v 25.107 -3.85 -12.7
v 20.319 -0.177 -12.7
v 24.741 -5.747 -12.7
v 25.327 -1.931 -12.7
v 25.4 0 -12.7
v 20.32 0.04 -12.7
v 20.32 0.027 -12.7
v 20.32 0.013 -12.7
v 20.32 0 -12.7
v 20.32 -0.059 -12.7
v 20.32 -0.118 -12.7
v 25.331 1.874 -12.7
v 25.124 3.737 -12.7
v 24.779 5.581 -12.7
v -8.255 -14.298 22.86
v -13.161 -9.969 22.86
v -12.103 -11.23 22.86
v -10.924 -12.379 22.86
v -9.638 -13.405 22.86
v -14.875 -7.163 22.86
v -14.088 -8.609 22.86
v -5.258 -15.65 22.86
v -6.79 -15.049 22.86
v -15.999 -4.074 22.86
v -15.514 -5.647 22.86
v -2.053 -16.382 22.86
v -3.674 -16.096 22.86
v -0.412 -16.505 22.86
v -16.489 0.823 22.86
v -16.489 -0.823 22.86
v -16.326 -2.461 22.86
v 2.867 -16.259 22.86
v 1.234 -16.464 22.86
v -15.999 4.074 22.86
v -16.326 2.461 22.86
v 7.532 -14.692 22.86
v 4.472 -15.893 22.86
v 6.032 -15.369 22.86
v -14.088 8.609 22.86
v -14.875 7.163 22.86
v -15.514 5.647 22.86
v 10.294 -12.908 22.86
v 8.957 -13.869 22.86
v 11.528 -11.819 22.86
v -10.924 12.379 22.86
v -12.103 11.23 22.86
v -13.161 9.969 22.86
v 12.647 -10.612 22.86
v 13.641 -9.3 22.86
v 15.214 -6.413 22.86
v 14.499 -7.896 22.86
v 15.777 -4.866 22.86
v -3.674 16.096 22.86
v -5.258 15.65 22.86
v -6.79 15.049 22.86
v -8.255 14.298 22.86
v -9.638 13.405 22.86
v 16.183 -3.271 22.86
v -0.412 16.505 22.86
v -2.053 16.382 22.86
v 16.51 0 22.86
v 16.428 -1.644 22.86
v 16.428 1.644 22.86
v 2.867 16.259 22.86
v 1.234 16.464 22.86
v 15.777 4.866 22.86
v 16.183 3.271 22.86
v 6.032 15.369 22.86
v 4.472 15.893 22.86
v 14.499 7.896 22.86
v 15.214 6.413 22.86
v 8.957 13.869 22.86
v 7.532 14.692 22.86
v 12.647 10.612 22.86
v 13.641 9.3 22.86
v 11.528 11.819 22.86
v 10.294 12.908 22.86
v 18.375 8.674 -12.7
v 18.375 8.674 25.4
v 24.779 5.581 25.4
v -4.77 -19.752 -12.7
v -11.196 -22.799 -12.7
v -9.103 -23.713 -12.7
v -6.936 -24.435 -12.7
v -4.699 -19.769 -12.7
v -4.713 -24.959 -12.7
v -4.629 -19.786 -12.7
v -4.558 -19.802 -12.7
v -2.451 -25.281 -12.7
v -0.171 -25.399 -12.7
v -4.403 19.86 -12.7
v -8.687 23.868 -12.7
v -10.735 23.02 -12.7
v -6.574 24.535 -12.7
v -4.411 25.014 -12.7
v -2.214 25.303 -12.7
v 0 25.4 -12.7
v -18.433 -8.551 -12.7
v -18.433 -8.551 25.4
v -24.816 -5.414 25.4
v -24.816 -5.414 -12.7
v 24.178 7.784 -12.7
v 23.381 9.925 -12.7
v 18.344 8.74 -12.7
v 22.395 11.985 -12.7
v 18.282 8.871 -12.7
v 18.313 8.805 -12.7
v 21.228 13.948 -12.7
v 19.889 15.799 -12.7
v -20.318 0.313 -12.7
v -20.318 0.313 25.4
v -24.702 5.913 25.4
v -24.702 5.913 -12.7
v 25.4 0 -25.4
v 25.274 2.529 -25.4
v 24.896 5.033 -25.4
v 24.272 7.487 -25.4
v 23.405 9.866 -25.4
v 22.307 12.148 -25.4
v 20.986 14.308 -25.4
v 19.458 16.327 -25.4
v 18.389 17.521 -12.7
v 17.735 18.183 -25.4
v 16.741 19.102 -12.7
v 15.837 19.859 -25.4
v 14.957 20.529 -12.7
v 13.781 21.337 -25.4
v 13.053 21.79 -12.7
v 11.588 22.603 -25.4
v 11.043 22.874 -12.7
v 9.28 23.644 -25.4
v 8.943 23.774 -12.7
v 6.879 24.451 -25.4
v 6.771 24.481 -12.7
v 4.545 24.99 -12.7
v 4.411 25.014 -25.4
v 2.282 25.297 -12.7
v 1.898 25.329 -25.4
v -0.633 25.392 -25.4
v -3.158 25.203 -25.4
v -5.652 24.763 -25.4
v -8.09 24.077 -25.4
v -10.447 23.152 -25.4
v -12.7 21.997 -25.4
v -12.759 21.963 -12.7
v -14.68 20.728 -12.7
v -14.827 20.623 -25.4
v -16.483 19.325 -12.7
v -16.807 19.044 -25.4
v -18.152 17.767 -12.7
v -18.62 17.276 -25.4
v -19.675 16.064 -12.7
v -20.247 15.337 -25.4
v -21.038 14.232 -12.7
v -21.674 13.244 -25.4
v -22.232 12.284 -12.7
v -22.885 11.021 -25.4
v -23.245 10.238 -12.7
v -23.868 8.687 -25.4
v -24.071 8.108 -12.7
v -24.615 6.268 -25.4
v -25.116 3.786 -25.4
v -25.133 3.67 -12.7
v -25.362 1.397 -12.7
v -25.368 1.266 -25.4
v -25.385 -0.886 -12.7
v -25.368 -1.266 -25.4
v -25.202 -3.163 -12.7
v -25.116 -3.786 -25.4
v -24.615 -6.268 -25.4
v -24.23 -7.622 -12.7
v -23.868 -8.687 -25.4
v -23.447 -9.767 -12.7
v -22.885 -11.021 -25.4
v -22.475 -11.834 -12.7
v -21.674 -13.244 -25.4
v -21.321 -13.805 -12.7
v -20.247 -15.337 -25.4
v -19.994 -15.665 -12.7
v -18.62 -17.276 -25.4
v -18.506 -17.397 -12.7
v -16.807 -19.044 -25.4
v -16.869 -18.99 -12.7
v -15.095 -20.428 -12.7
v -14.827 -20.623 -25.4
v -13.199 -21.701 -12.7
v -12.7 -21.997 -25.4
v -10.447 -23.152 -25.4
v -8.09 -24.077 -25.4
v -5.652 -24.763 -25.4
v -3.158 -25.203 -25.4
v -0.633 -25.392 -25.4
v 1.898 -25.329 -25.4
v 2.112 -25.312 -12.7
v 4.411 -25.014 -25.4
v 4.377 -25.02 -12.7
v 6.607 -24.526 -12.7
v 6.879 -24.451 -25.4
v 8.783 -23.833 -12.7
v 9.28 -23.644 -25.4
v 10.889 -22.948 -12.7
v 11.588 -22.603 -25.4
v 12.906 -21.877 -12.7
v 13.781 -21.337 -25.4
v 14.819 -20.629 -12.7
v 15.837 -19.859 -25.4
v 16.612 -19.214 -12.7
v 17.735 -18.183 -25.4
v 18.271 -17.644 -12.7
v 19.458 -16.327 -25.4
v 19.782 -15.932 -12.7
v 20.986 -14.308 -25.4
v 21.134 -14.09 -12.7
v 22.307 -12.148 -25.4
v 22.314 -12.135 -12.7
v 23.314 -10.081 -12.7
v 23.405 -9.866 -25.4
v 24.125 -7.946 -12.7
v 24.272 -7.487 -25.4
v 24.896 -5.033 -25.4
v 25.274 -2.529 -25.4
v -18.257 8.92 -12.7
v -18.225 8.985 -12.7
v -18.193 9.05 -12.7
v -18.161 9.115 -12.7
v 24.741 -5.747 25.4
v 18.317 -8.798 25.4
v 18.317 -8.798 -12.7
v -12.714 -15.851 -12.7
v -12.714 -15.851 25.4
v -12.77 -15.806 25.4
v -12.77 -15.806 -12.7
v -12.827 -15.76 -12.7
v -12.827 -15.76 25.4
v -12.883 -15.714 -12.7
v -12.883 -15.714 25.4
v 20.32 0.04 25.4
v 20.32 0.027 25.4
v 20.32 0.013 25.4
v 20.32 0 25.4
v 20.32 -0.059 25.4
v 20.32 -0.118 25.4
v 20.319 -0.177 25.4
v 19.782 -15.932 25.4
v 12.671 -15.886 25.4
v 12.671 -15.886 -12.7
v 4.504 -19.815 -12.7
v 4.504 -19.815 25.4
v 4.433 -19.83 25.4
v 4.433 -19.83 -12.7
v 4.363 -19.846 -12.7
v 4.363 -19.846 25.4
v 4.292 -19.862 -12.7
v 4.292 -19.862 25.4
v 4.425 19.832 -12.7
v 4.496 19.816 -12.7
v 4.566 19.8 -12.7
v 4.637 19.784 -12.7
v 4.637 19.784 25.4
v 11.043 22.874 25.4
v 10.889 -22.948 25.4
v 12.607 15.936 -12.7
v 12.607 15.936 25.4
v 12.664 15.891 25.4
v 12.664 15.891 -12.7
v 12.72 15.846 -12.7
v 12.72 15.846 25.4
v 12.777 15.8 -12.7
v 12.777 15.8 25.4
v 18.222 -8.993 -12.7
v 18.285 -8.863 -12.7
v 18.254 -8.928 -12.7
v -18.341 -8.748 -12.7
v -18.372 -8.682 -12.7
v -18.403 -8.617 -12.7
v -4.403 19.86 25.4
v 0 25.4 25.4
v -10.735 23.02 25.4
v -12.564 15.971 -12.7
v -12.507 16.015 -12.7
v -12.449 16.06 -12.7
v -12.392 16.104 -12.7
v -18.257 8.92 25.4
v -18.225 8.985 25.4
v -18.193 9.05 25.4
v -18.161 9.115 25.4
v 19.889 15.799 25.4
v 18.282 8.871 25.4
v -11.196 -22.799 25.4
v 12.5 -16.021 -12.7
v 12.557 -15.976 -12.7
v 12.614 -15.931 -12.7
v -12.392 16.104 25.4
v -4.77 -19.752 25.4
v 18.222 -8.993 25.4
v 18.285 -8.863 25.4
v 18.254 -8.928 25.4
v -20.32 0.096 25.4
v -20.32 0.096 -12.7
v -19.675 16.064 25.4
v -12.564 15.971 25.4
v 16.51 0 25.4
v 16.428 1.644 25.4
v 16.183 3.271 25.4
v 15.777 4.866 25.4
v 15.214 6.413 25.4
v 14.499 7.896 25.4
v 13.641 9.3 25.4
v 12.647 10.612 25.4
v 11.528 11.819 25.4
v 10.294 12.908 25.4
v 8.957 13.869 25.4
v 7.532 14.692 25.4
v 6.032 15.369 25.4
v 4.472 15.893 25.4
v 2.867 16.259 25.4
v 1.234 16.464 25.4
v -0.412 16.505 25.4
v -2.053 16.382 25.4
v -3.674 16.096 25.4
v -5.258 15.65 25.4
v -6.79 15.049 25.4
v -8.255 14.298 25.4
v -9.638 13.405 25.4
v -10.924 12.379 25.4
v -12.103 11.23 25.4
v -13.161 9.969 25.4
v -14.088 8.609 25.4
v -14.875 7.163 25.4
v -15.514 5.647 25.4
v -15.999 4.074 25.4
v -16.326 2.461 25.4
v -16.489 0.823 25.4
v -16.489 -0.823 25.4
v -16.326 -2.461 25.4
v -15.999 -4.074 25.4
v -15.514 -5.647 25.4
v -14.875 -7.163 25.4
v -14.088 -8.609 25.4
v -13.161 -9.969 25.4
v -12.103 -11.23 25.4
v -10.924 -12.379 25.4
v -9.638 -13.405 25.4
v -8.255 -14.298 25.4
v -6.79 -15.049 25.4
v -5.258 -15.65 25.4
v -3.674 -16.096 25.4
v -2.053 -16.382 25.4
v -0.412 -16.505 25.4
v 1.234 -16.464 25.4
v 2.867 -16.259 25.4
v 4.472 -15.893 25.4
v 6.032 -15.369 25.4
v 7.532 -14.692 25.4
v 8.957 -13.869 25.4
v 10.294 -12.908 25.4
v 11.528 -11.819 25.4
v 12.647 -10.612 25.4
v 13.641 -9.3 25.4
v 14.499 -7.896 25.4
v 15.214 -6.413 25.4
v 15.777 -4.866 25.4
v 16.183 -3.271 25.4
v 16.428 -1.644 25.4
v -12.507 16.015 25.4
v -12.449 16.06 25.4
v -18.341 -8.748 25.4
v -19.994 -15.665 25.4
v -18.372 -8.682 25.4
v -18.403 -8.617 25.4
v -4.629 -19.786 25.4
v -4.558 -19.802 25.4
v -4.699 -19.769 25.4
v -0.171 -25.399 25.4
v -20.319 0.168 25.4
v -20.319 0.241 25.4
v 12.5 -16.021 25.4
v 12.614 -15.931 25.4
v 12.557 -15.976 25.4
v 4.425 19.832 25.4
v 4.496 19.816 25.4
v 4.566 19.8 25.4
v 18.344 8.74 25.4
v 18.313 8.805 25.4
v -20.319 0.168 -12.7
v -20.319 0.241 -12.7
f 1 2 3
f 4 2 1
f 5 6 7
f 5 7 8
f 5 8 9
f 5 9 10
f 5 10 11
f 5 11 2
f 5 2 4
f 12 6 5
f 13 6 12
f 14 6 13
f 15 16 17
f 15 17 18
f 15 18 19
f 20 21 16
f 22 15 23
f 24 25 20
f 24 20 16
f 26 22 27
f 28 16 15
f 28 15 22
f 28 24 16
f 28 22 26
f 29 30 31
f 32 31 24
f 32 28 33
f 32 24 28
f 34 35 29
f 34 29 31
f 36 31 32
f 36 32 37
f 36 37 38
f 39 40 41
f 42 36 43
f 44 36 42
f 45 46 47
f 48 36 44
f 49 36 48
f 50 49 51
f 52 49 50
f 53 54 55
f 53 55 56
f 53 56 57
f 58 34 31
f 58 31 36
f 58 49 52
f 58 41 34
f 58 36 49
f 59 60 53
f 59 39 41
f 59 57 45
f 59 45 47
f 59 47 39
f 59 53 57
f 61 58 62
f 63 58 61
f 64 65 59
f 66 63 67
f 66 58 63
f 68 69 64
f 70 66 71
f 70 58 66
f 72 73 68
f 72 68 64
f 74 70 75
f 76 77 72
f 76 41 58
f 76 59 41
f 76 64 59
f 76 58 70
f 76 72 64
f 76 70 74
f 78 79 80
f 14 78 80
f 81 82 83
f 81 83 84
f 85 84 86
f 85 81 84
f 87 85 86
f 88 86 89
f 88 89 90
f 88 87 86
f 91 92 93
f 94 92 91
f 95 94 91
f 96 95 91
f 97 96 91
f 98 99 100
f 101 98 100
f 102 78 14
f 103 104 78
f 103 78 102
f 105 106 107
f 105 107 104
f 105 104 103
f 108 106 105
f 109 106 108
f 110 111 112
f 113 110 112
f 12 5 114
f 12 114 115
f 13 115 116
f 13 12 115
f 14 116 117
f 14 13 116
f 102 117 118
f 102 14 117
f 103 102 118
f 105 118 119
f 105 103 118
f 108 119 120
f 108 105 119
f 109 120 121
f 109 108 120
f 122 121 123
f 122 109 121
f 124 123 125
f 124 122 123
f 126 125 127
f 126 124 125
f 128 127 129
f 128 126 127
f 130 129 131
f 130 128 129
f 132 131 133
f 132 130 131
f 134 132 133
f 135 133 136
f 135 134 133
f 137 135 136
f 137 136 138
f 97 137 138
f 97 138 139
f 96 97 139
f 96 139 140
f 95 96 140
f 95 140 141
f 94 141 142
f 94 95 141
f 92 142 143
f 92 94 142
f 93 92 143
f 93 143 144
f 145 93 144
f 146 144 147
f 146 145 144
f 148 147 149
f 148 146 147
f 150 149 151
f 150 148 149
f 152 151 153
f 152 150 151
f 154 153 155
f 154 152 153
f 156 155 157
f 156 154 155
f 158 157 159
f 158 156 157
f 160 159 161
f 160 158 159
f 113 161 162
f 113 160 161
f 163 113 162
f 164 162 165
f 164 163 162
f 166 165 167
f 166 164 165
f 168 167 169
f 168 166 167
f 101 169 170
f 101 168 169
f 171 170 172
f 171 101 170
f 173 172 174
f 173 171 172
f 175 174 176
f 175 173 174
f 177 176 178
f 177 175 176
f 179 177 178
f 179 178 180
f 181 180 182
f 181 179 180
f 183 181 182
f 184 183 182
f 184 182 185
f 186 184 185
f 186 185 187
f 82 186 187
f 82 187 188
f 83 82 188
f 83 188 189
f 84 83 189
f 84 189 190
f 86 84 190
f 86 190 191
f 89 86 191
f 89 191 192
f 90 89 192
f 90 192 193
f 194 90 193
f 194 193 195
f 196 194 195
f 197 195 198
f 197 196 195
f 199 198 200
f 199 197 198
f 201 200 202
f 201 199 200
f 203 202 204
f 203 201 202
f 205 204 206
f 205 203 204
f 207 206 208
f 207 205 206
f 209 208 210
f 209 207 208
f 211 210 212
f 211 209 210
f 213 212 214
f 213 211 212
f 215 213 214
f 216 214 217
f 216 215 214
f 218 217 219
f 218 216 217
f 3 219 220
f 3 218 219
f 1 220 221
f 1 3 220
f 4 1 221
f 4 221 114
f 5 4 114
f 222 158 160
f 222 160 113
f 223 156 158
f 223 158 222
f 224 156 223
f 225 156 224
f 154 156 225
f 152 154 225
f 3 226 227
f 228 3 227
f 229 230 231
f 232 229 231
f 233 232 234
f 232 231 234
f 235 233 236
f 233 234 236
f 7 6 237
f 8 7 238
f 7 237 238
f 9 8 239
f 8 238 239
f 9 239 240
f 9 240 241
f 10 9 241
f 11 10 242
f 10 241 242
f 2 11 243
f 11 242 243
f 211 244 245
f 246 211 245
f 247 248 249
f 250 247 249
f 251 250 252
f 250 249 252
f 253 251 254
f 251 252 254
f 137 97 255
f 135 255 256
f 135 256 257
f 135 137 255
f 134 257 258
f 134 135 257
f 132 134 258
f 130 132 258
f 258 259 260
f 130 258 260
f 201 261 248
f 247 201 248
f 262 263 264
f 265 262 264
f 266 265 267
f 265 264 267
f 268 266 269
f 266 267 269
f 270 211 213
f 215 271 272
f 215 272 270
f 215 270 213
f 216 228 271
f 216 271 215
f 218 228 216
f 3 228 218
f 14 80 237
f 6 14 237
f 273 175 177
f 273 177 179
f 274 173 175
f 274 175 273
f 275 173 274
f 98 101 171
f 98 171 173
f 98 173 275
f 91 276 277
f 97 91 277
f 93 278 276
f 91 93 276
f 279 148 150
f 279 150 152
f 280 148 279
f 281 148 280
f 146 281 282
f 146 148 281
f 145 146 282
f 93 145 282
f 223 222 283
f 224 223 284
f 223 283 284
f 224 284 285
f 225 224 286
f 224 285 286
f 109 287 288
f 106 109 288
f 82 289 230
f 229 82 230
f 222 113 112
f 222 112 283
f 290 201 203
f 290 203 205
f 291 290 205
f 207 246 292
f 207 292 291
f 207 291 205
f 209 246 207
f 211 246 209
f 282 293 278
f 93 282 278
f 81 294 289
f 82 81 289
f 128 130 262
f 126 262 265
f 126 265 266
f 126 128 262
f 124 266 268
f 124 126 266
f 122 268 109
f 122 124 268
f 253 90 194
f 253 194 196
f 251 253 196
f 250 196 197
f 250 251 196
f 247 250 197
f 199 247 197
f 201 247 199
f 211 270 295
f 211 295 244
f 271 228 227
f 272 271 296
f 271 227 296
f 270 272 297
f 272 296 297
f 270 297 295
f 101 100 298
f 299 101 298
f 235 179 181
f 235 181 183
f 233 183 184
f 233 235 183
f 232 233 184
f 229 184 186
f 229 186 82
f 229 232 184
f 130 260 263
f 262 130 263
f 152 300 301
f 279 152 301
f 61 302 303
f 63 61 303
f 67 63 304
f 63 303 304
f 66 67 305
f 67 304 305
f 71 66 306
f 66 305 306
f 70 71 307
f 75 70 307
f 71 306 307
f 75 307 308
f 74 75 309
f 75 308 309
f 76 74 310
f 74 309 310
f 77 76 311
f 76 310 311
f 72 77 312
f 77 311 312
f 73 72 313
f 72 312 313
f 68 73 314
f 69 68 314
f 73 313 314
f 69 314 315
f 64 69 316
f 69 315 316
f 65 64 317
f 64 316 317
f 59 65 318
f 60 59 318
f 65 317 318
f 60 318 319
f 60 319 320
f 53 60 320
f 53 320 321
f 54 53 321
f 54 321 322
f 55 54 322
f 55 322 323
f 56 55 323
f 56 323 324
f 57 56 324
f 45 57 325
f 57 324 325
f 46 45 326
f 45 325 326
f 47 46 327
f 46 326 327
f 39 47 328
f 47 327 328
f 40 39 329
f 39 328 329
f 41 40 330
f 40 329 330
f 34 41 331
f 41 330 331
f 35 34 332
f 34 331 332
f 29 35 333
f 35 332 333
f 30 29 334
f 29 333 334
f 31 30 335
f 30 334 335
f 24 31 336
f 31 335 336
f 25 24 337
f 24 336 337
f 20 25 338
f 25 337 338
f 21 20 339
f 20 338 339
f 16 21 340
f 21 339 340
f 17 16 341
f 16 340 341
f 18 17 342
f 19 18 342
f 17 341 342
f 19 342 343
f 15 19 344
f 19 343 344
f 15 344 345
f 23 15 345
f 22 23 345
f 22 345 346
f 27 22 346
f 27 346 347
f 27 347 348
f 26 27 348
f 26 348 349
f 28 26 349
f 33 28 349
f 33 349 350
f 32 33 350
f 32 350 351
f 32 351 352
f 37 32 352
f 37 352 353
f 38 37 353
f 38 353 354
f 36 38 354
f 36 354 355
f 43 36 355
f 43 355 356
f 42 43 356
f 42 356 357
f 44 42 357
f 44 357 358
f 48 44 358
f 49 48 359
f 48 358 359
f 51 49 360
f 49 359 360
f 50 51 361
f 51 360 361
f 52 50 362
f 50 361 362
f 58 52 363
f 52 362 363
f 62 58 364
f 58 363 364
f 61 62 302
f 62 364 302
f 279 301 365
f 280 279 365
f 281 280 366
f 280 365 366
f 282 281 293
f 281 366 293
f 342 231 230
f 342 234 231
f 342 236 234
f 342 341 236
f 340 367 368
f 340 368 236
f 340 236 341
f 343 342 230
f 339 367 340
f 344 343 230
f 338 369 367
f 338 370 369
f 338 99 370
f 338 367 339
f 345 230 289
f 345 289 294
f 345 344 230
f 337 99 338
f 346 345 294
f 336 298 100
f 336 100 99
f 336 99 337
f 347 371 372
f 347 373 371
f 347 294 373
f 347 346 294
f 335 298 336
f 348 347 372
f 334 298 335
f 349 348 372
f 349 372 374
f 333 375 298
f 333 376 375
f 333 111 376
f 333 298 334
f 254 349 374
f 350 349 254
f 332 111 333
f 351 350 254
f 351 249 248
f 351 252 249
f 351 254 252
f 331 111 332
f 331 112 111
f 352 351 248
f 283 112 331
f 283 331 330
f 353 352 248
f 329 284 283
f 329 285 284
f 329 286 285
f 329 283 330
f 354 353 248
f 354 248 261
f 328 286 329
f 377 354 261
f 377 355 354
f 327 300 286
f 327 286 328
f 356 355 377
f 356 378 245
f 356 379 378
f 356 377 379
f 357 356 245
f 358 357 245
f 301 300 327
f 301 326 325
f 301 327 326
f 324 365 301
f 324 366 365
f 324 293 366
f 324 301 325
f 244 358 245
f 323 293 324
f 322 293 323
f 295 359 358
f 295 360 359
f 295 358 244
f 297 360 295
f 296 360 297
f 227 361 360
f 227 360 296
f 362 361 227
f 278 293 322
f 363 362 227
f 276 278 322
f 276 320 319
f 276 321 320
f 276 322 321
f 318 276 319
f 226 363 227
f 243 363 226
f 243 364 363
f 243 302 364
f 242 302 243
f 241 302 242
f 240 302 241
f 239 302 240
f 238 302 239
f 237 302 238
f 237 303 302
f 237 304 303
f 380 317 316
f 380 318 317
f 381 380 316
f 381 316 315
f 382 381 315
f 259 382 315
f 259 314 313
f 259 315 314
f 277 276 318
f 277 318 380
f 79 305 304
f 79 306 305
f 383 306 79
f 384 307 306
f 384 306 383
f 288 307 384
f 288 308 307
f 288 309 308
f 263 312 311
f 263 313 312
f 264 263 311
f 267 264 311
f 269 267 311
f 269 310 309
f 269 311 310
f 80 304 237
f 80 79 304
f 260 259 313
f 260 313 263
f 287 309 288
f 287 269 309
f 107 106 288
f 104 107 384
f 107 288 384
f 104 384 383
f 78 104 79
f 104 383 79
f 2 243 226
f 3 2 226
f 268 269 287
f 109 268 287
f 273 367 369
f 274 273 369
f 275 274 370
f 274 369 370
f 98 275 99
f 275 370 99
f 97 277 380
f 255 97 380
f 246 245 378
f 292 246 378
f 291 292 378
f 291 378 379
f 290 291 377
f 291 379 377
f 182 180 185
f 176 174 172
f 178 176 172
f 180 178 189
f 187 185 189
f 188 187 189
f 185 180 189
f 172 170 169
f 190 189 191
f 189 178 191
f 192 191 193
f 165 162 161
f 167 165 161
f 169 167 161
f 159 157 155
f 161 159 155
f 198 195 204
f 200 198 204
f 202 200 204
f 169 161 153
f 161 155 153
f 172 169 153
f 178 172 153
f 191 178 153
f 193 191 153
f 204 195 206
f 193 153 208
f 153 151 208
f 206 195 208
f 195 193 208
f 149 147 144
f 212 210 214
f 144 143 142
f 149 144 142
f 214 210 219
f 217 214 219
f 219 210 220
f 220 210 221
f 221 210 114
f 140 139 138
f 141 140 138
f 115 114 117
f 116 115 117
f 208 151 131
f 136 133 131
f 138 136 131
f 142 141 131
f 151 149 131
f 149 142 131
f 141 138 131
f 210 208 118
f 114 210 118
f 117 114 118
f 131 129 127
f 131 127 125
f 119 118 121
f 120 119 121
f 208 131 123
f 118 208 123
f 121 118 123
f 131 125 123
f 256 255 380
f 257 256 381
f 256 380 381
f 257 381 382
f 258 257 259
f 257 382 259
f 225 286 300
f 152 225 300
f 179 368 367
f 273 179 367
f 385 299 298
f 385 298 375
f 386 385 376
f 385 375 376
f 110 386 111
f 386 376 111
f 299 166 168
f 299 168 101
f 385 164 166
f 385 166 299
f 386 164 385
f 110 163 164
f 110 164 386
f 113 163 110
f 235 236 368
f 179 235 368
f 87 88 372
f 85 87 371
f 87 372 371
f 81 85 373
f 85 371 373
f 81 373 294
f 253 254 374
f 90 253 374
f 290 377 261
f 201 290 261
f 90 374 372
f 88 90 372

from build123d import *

# Parameters (mm, degrees)
F0_R     = 25.4
F1_DEPTH = 25.4
F3_DEPTH = 38.1
F4_R     = 16.51
F5_DEPTH = 2.54


with BuildPart() as f1:
    # F0 (on Top) → F1 (new body, symmetric)
    with BuildSketch(Plane.XY):
        Circle(F0_R)
    extrude(amount=F1_DEPTH, both=True)

    # F2 (on face) → F3 (cut)
    with BuildSketch(Plane.XY.offset(25.4)):
        with BuildLine():
            Line((-4.4029086505, 19.8602374906), (0, 25.4))
            ThreePointArc((0, 25.4), (-5.497566194, 24.7979185808), (-10.7345038482, 23.0202177907))
            Line((-10.7345038482, 23.0202177907), (-4.4029086505, 19.8602374906))
        make_face()
        with BuildLine():
            Line((4.6370208097, 19.7838428525), (11.0425876049, 22.8740302305))
            ThreePointArc((11.0425876049, 22.8740302305), (5.6639046666, 24.7604560525), (0, 25.4))
            Line((0, 25.4), (4.4250969953, 19.83232))
            ThreePointArc((4.4250969953, 19.83232), (4.5311237333, 19.808364842), (4.6370208097, 19.7838428525))
        make_face()
        with BuildLine():
            Line((12.776857167, 15.8004531876), (19.8888569054, 15.7985243297))
            ThreePointArc((19.8888569054, 15.7985243297), (15.865190223, 19.8357187716), (11.0425876049, 22.8740302305))
            Line((11.0425876049, 22.8740302305), (12.6070839942, 15.9362427555))
            ThreePointArc((12.6070839942, 15.9362427555), (12.6921521784, 15.8685750173), (12.776857167, 15.8004531876))
        make_face()
        with BuildLine():
            ThreePointArc((18.2815817765, 8.8705224056), (18.3287717486, 8.7726008794), (18.3754372288, 8.6744283184))
            Line((18.3754372288, 8.6744283184), (24.7793268915, 5.5807668652))
            ThreePointArc((24.7793268915, 5.5807668652), (22.9109646857, 10.9657510992), (19.8888569054, 15.7985243297))
            Line((19.8888569054, 15.7985243297), (18.2815817765, 8.8705224056))
        make_face()
        with BuildLine():
            ThreePointArc((20.319959645, 0.0404972182), (20.3199899113, 0.0202486192), (20.32, 0))
            ThreePointArc((20.32, 0), (20.3198074922, -0.0884504401), (20.3192299724, -0.1768992043))
            Line((20.3192299724, -0.1768992043), (24.7413062764, -5.7469786617))
            ThreePointArc((24.7413062764, -5.7469786617), (25.2347892741, -2.8923019016), (25.4, 0))
            ThreePointArc((25.4, 0), (25.2443548446, 2.8075876616), (24.7793268915, 5.5807668652))
            Line((24.7793268915, 5.5807668652), (20.319959645, 0.0404972182))
        make_face()
        with BuildLine():
            Line((24.7413062764, -5.7469786617), (18.3167939088, -8.7975826738))
            ThreePointArc((18.3167939088, -8.7975826738), (18.2694704717, -8.895439769), (18.2216242397, -8.9930423143))
            Line((18.2216242397, -8.9930423143), (19.78235718, -15.9316773882))
            ThreePointArc((19.78235718, -15.9316773882), (22.8368380896, -11.1192997112), (24.7413062764, -5.7469786617))
        make_face()
        with BuildLine():
            ThreePointArc((10.8887910596, -22.9476410391), (15.7316804593, -19.9417709827), (19.78235718, -15.9316773882))
            Line((19.78235718, -15.9316773882), (12.6705047326, -15.8858650951))
            ThreePointArc((12.6705047326, -15.8858650951), (12.5853443674, -15.9534167862), (12.4998238629, -16.020511958))
            Line((12.4998238629, -16.020511958), (10.8887910596, -22.9476410391))
        make_face()
        with BuildLine():
            ThreePointArc((-0.1705039618, -25.3994277179), (5.497566194, -24.7979185808), (10.8887910596, -22.9476410391))
            Line((10.8887910596, -22.9476410391), (4.5041122558, -19.8145242887))
            ThreePointArc((4.5041122558, -19.8145242887), (4.3980529552, -19.8383348647), (4.291867801, -19.8615777515))
            Line((4.291867801, -19.8615777515), (-0.1705039618, -25.3994277179))
        make_face()
        with BuildLine():
            ThreePointArc((-11.1958865538, -22.799388682), (-5.8299879147, -24.7218777789), (-0.1705039618, -25.3994277179))
            Line((-0.1705039618, -25.3994277179), (-4.5581267877, -19.8021685728))
            ThreePointArc((-4.5581267877, -19.8021685728), (-4.6639903317, -19.7775022231), (-4.7697204121, -19.752269925))
            Line((-4.7697204121, -19.752269925), (-11.1958865538, -22.799388682))
        make_face()
        with BuildLine():
            ThreePointArc((-19.9944604075, -15.6646593648), (-15.9979850762, -19.7287727318), (-11.1958865538, -22.799388682))
            Line((-11.1958865538, -22.799388682), (-12.7137760303, -15.8512554409))
            ThreePointArc((-12.7137760303, -15.8512554409), (-12.798388061, -15.7830181854), (-12.882633856, -15.7143292868))
            Line((-12.882633856, -15.7143292868), (-19.9944604075, -15.6646593648))
        make_face()
        with BuildLine():
            ThreePointArc((-24.816230911, -5.4143035905), (-22.9840588775, -10.8117083532), (-19.9944604075, -15.6646593648))
            Line((-19.9944604075, -15.6646593648), (-18.3407155164, -8.7476027772))
            ThreePointArc((-18.3407155164, -8.7476027772), (-18.387247102, -8.6493666825), (-18.4332525225, -8.5508830796))
            Line((-18.4332525225, -8.5508830796), (-24.816230911, -5.4143035905))
        make_face()
        with BuildLine():
            Line((-20.3175846832, 0.313293219), (-24.7021707789, 5.9129314903))
            ThreePointArc((-24.7021707789, 5.9129314903), (-25.3987123714, 0.2557535417), (-24.816230911, -5.4143035905))
            Line((-24.816230911, -5.4143035905), (-20.3197736682, 0.0959065927))
            ThreePointArc((-20.3197736682, 0.0959065927), (-20.3189698971, 0.2046028333), (-20.3175846832, 0.313293219))
        make_face()
        with BuildLine():
            Line((-18.1608456078, 9.1151569822), (-19.6749660304, 16.0641125401))
            ThreePointArc((-19.6749660304, 16.0641125401), (-22.7616824296, 11.27234727), (-24.7021707789, 5.9129314903))
            Line((-24.7021707789, 5.9129314903), (-18.2573252052, 8.9203405963))
            ThreePointArc((-18.2573252052, 8.9203405963), (-18.2093459437, 9.017877816), (-18.1608456078, 9.1151569822))
        make_face()
        with BuildLine():
            Line((-12.3920004699, 16.1040592508), (-10.7345038482, 23.0202177907))
            ThreePointArc((-10.7345038482, 23.0202177907), (-15.5974618012, 20.0469245861), (-19.6749660304, 16.0641125401))
            Line((-19.6749660304, 16.0641125401), (-12.5635813453, 15.9705611604))
            ThreePointArc((-12.5635813453, 15.9705611604), (-12.4779694409, 16.0375396689), (-12.3920004699, 16.1040592508))
        make_face()
    extrude(amount=-F3_DEPTH, mode=Mode.SUBTRACT)

    # F4 (on face) → F5 (cut)
    with BuildSketch(Plane.XY.offset(25.4)):
        Circle(F4_R)
    extrude(amount=-F5_DEPTH, mode=Mode.SUBTRACT)


solid = f1.part
